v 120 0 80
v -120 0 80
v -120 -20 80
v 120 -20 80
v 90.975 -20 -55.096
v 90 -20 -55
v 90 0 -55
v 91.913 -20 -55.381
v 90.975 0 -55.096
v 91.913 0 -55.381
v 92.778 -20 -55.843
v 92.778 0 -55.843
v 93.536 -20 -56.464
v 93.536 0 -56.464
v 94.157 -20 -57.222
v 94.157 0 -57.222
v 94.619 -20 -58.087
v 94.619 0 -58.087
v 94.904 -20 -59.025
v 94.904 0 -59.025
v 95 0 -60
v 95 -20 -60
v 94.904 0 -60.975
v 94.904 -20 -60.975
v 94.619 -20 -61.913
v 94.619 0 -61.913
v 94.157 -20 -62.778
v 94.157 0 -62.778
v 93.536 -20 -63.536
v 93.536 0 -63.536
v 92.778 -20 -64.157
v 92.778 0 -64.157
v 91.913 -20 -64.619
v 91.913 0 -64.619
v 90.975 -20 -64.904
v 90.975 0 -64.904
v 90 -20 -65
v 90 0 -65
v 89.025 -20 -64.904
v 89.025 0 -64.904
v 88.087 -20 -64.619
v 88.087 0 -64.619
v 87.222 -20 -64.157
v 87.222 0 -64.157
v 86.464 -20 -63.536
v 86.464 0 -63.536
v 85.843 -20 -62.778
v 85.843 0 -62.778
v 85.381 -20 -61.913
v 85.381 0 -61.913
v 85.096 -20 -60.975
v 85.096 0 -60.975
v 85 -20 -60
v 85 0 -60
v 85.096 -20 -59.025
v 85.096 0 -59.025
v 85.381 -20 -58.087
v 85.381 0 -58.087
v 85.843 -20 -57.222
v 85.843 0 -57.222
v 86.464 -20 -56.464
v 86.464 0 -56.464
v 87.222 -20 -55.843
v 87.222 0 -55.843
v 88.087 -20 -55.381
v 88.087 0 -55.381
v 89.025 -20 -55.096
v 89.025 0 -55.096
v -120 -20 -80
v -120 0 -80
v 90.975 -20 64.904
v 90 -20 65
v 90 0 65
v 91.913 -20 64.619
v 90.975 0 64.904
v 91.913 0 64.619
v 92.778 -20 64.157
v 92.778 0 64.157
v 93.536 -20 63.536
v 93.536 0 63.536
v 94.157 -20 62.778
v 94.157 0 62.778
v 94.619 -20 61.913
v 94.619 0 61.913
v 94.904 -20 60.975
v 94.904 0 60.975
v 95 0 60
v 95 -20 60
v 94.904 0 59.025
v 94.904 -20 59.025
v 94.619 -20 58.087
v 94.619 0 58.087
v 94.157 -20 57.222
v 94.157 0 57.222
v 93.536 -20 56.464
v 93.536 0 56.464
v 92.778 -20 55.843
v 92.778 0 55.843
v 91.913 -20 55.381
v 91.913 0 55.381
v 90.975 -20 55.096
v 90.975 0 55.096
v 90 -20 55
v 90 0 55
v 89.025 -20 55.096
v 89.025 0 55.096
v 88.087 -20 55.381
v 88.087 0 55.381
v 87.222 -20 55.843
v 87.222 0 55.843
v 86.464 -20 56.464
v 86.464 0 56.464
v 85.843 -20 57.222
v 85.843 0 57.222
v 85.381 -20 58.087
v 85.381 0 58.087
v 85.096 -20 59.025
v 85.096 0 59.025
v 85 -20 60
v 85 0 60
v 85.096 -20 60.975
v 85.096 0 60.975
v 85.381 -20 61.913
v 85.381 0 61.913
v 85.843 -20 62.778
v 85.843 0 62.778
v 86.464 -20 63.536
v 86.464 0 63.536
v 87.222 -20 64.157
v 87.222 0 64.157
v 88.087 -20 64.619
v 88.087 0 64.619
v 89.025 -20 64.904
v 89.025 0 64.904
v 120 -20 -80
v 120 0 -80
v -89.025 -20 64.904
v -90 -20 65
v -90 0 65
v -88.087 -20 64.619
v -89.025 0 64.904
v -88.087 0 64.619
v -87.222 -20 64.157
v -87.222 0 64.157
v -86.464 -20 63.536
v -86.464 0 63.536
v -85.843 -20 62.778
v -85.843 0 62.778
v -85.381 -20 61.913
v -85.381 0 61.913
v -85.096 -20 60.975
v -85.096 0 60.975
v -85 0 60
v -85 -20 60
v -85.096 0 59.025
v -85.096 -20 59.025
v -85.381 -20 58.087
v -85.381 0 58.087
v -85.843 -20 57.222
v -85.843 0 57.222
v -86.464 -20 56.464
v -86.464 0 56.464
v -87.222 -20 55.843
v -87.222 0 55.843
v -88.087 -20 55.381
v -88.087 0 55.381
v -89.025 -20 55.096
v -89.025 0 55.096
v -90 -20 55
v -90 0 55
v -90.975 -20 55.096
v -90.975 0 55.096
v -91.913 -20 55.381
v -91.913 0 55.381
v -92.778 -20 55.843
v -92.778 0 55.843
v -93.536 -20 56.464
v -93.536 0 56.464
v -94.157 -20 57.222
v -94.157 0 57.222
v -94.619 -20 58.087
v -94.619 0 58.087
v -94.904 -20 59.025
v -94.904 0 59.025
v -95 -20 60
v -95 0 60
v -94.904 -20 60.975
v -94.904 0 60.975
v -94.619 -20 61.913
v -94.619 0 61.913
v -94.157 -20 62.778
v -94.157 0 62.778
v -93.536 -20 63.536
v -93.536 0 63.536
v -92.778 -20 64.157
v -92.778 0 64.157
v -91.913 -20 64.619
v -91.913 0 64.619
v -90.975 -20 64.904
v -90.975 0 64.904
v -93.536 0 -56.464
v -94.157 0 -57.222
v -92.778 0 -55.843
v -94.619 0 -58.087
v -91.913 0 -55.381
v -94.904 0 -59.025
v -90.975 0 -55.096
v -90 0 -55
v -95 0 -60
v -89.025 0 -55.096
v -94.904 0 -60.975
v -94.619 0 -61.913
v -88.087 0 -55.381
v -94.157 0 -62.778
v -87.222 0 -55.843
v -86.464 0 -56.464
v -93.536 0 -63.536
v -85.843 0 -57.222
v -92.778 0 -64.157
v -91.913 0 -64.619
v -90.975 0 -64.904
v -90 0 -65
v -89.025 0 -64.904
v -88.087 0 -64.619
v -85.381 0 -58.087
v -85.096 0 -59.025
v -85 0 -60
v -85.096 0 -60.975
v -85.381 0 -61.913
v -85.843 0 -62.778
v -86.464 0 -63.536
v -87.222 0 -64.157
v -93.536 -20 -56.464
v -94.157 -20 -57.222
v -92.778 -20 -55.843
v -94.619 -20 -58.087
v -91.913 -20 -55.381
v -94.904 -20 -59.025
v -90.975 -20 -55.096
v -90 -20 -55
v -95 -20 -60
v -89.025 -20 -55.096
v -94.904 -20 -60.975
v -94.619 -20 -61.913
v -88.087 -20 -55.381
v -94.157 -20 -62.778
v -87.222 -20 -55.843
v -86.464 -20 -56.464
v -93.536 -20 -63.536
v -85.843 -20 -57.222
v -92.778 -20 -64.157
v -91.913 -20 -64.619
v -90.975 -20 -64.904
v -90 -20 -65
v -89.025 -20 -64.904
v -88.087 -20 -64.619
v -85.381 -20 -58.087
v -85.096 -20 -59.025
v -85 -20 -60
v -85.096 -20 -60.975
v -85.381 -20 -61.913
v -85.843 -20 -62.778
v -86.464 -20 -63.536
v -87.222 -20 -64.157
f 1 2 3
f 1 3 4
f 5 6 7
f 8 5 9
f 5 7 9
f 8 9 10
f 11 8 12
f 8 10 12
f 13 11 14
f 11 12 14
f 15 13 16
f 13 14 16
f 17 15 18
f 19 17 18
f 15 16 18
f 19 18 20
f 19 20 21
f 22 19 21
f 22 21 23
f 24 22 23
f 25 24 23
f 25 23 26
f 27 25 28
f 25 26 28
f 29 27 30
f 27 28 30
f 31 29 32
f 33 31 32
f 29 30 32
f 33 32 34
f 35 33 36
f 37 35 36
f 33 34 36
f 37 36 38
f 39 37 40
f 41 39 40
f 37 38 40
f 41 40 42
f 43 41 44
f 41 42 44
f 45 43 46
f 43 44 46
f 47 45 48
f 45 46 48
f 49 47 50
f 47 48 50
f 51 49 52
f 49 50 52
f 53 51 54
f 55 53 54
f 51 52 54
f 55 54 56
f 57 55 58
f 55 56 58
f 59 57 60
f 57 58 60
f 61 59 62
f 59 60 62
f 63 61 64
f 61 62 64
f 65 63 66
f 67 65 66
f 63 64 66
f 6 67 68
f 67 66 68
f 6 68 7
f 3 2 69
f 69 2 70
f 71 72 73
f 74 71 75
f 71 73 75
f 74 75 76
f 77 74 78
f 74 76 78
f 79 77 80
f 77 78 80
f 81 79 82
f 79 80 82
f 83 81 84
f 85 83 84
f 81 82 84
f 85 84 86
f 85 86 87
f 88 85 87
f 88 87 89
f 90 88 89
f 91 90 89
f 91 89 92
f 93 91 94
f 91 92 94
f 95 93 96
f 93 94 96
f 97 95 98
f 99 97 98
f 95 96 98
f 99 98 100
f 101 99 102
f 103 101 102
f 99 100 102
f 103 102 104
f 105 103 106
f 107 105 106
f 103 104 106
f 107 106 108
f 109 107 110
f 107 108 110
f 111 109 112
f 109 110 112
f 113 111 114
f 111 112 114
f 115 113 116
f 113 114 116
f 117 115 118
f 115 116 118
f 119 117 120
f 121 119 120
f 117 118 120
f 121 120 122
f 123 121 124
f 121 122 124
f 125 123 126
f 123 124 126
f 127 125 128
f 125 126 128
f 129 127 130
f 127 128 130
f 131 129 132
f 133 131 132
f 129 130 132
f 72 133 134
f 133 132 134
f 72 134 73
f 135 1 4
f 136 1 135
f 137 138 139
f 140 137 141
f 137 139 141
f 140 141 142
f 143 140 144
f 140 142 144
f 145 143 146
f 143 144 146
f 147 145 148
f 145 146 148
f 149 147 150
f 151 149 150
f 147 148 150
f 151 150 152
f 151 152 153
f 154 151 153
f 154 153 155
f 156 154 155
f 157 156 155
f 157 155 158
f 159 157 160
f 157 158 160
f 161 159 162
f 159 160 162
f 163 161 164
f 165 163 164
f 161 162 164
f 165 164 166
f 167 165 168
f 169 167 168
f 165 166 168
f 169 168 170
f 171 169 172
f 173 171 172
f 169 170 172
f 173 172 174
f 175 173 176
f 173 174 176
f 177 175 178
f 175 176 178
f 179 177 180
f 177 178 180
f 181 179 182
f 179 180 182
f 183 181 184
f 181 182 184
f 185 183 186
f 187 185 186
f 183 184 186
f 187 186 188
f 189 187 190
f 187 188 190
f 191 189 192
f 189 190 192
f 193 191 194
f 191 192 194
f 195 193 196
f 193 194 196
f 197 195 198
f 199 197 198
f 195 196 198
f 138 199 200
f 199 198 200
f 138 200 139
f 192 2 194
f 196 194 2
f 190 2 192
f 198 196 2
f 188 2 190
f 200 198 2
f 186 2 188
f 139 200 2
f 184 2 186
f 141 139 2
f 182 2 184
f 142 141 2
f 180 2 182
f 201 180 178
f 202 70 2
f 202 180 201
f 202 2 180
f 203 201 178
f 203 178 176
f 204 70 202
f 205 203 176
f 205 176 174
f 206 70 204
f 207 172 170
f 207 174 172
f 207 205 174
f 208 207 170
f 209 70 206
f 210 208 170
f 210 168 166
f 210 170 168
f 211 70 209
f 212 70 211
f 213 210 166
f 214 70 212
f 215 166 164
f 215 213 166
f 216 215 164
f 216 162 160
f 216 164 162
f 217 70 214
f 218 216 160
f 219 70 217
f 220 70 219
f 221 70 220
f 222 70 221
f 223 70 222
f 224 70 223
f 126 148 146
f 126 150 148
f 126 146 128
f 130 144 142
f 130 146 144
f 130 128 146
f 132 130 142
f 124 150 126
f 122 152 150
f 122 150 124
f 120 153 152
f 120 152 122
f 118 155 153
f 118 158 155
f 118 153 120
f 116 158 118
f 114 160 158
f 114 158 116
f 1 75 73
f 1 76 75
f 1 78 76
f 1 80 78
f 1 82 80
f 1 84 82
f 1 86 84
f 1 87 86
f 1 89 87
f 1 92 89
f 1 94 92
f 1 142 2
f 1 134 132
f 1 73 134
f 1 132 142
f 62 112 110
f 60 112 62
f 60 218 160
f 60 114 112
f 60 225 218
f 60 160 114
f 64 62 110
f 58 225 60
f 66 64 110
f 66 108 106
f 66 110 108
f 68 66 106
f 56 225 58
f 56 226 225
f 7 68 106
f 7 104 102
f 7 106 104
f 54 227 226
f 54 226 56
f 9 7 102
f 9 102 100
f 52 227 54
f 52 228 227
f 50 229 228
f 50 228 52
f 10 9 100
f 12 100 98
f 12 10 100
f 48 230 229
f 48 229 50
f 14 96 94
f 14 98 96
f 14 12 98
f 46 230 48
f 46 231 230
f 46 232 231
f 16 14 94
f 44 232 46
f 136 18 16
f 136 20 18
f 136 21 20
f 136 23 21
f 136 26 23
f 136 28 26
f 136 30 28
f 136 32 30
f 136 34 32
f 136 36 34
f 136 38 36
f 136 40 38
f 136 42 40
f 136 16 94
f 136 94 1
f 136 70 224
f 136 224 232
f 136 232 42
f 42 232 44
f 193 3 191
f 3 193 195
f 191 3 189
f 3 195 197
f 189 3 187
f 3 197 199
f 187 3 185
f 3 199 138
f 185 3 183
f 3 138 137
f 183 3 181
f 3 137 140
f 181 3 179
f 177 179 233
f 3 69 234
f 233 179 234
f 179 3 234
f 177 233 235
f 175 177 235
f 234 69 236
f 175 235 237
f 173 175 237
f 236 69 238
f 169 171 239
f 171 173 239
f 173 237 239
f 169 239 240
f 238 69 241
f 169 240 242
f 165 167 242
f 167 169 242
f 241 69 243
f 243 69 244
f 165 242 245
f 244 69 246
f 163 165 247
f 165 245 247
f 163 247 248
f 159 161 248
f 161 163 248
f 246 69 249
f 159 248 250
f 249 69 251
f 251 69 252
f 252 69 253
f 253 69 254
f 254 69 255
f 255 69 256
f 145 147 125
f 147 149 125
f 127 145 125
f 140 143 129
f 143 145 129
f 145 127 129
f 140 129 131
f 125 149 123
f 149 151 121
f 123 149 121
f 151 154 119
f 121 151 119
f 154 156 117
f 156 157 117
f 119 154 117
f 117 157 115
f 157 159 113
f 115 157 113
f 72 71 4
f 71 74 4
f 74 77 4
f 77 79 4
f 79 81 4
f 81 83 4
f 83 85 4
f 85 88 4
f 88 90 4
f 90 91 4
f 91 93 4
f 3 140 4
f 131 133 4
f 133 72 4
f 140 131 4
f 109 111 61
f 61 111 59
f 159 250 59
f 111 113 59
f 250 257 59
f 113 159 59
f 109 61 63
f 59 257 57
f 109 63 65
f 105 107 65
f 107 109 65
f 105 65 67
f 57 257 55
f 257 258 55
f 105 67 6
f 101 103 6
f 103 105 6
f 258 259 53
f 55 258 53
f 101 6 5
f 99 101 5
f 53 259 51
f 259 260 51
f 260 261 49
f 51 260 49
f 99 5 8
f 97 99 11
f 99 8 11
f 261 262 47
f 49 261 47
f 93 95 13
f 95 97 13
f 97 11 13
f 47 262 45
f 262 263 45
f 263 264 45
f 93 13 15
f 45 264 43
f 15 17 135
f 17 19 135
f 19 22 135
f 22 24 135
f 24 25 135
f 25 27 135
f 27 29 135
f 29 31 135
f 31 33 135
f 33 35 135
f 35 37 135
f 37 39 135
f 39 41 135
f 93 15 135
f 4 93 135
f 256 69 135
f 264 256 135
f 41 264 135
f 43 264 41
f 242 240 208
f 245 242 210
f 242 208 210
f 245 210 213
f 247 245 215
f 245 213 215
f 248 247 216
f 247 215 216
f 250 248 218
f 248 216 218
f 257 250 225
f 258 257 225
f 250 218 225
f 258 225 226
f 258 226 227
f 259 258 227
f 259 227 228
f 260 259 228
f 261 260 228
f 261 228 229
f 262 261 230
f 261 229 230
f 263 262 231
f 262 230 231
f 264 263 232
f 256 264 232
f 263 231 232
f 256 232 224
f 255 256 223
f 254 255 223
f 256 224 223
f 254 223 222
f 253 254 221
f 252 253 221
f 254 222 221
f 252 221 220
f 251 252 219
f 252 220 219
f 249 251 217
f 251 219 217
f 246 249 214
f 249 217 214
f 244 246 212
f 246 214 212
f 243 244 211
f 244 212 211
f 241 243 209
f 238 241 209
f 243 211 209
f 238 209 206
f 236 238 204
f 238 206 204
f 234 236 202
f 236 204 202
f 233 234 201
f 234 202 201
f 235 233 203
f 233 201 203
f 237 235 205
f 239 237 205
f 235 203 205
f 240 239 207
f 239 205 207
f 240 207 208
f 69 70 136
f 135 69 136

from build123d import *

# Parameters (mm, degrees)
SKETCH_1_W          = 240
SKETCH_1_H          = 160
EXTRUDE_1_DEPTH     = 20
SKETCH_2_R          = 5
CUT_EXTRUDE_1_DEPTH = 20


with BuildPart() as part:
    # 草图1 → 凸台-拉伸1 (new body)
    with BuildSketch(Plane(origin=(0, 0, 0), x_dir=(1, 0, 0), z_dir=(0, 1, 0))):
        Rectangle(SKETCH_1_W, SKETCH_1_H)
    extrude(amount=-EXTRUDE_1_DEPTH)

    # 草图2 → 切除-拉伸1 (cut)
    with BuildSketch(Plane(origin=(0, 0, 0), x_dir=(1, 0, 0), z_dir=(0, 1, 0))):
        with Locations(Location((90, 60, 0), (0, 0, 270))):
            Circle(SKETCH_2_R)
        with Locations(Location((-90, 60, 0), (0, 0, 270))):
            Circle(SKETCH_2_R)
        with Locations(Location((90, -60, 0), (0, 0, 270))):
            Circle(SKETCH_2_R)
        with Locations(Location((-90, -60, 0), (0, 0, 270))):
            Circle(SKETCH_2_R)
    extrude(amount=-CUT_EXTRUDE_1_DEPTH, mode=Mode.SUBTRACT)


solid = part.part
